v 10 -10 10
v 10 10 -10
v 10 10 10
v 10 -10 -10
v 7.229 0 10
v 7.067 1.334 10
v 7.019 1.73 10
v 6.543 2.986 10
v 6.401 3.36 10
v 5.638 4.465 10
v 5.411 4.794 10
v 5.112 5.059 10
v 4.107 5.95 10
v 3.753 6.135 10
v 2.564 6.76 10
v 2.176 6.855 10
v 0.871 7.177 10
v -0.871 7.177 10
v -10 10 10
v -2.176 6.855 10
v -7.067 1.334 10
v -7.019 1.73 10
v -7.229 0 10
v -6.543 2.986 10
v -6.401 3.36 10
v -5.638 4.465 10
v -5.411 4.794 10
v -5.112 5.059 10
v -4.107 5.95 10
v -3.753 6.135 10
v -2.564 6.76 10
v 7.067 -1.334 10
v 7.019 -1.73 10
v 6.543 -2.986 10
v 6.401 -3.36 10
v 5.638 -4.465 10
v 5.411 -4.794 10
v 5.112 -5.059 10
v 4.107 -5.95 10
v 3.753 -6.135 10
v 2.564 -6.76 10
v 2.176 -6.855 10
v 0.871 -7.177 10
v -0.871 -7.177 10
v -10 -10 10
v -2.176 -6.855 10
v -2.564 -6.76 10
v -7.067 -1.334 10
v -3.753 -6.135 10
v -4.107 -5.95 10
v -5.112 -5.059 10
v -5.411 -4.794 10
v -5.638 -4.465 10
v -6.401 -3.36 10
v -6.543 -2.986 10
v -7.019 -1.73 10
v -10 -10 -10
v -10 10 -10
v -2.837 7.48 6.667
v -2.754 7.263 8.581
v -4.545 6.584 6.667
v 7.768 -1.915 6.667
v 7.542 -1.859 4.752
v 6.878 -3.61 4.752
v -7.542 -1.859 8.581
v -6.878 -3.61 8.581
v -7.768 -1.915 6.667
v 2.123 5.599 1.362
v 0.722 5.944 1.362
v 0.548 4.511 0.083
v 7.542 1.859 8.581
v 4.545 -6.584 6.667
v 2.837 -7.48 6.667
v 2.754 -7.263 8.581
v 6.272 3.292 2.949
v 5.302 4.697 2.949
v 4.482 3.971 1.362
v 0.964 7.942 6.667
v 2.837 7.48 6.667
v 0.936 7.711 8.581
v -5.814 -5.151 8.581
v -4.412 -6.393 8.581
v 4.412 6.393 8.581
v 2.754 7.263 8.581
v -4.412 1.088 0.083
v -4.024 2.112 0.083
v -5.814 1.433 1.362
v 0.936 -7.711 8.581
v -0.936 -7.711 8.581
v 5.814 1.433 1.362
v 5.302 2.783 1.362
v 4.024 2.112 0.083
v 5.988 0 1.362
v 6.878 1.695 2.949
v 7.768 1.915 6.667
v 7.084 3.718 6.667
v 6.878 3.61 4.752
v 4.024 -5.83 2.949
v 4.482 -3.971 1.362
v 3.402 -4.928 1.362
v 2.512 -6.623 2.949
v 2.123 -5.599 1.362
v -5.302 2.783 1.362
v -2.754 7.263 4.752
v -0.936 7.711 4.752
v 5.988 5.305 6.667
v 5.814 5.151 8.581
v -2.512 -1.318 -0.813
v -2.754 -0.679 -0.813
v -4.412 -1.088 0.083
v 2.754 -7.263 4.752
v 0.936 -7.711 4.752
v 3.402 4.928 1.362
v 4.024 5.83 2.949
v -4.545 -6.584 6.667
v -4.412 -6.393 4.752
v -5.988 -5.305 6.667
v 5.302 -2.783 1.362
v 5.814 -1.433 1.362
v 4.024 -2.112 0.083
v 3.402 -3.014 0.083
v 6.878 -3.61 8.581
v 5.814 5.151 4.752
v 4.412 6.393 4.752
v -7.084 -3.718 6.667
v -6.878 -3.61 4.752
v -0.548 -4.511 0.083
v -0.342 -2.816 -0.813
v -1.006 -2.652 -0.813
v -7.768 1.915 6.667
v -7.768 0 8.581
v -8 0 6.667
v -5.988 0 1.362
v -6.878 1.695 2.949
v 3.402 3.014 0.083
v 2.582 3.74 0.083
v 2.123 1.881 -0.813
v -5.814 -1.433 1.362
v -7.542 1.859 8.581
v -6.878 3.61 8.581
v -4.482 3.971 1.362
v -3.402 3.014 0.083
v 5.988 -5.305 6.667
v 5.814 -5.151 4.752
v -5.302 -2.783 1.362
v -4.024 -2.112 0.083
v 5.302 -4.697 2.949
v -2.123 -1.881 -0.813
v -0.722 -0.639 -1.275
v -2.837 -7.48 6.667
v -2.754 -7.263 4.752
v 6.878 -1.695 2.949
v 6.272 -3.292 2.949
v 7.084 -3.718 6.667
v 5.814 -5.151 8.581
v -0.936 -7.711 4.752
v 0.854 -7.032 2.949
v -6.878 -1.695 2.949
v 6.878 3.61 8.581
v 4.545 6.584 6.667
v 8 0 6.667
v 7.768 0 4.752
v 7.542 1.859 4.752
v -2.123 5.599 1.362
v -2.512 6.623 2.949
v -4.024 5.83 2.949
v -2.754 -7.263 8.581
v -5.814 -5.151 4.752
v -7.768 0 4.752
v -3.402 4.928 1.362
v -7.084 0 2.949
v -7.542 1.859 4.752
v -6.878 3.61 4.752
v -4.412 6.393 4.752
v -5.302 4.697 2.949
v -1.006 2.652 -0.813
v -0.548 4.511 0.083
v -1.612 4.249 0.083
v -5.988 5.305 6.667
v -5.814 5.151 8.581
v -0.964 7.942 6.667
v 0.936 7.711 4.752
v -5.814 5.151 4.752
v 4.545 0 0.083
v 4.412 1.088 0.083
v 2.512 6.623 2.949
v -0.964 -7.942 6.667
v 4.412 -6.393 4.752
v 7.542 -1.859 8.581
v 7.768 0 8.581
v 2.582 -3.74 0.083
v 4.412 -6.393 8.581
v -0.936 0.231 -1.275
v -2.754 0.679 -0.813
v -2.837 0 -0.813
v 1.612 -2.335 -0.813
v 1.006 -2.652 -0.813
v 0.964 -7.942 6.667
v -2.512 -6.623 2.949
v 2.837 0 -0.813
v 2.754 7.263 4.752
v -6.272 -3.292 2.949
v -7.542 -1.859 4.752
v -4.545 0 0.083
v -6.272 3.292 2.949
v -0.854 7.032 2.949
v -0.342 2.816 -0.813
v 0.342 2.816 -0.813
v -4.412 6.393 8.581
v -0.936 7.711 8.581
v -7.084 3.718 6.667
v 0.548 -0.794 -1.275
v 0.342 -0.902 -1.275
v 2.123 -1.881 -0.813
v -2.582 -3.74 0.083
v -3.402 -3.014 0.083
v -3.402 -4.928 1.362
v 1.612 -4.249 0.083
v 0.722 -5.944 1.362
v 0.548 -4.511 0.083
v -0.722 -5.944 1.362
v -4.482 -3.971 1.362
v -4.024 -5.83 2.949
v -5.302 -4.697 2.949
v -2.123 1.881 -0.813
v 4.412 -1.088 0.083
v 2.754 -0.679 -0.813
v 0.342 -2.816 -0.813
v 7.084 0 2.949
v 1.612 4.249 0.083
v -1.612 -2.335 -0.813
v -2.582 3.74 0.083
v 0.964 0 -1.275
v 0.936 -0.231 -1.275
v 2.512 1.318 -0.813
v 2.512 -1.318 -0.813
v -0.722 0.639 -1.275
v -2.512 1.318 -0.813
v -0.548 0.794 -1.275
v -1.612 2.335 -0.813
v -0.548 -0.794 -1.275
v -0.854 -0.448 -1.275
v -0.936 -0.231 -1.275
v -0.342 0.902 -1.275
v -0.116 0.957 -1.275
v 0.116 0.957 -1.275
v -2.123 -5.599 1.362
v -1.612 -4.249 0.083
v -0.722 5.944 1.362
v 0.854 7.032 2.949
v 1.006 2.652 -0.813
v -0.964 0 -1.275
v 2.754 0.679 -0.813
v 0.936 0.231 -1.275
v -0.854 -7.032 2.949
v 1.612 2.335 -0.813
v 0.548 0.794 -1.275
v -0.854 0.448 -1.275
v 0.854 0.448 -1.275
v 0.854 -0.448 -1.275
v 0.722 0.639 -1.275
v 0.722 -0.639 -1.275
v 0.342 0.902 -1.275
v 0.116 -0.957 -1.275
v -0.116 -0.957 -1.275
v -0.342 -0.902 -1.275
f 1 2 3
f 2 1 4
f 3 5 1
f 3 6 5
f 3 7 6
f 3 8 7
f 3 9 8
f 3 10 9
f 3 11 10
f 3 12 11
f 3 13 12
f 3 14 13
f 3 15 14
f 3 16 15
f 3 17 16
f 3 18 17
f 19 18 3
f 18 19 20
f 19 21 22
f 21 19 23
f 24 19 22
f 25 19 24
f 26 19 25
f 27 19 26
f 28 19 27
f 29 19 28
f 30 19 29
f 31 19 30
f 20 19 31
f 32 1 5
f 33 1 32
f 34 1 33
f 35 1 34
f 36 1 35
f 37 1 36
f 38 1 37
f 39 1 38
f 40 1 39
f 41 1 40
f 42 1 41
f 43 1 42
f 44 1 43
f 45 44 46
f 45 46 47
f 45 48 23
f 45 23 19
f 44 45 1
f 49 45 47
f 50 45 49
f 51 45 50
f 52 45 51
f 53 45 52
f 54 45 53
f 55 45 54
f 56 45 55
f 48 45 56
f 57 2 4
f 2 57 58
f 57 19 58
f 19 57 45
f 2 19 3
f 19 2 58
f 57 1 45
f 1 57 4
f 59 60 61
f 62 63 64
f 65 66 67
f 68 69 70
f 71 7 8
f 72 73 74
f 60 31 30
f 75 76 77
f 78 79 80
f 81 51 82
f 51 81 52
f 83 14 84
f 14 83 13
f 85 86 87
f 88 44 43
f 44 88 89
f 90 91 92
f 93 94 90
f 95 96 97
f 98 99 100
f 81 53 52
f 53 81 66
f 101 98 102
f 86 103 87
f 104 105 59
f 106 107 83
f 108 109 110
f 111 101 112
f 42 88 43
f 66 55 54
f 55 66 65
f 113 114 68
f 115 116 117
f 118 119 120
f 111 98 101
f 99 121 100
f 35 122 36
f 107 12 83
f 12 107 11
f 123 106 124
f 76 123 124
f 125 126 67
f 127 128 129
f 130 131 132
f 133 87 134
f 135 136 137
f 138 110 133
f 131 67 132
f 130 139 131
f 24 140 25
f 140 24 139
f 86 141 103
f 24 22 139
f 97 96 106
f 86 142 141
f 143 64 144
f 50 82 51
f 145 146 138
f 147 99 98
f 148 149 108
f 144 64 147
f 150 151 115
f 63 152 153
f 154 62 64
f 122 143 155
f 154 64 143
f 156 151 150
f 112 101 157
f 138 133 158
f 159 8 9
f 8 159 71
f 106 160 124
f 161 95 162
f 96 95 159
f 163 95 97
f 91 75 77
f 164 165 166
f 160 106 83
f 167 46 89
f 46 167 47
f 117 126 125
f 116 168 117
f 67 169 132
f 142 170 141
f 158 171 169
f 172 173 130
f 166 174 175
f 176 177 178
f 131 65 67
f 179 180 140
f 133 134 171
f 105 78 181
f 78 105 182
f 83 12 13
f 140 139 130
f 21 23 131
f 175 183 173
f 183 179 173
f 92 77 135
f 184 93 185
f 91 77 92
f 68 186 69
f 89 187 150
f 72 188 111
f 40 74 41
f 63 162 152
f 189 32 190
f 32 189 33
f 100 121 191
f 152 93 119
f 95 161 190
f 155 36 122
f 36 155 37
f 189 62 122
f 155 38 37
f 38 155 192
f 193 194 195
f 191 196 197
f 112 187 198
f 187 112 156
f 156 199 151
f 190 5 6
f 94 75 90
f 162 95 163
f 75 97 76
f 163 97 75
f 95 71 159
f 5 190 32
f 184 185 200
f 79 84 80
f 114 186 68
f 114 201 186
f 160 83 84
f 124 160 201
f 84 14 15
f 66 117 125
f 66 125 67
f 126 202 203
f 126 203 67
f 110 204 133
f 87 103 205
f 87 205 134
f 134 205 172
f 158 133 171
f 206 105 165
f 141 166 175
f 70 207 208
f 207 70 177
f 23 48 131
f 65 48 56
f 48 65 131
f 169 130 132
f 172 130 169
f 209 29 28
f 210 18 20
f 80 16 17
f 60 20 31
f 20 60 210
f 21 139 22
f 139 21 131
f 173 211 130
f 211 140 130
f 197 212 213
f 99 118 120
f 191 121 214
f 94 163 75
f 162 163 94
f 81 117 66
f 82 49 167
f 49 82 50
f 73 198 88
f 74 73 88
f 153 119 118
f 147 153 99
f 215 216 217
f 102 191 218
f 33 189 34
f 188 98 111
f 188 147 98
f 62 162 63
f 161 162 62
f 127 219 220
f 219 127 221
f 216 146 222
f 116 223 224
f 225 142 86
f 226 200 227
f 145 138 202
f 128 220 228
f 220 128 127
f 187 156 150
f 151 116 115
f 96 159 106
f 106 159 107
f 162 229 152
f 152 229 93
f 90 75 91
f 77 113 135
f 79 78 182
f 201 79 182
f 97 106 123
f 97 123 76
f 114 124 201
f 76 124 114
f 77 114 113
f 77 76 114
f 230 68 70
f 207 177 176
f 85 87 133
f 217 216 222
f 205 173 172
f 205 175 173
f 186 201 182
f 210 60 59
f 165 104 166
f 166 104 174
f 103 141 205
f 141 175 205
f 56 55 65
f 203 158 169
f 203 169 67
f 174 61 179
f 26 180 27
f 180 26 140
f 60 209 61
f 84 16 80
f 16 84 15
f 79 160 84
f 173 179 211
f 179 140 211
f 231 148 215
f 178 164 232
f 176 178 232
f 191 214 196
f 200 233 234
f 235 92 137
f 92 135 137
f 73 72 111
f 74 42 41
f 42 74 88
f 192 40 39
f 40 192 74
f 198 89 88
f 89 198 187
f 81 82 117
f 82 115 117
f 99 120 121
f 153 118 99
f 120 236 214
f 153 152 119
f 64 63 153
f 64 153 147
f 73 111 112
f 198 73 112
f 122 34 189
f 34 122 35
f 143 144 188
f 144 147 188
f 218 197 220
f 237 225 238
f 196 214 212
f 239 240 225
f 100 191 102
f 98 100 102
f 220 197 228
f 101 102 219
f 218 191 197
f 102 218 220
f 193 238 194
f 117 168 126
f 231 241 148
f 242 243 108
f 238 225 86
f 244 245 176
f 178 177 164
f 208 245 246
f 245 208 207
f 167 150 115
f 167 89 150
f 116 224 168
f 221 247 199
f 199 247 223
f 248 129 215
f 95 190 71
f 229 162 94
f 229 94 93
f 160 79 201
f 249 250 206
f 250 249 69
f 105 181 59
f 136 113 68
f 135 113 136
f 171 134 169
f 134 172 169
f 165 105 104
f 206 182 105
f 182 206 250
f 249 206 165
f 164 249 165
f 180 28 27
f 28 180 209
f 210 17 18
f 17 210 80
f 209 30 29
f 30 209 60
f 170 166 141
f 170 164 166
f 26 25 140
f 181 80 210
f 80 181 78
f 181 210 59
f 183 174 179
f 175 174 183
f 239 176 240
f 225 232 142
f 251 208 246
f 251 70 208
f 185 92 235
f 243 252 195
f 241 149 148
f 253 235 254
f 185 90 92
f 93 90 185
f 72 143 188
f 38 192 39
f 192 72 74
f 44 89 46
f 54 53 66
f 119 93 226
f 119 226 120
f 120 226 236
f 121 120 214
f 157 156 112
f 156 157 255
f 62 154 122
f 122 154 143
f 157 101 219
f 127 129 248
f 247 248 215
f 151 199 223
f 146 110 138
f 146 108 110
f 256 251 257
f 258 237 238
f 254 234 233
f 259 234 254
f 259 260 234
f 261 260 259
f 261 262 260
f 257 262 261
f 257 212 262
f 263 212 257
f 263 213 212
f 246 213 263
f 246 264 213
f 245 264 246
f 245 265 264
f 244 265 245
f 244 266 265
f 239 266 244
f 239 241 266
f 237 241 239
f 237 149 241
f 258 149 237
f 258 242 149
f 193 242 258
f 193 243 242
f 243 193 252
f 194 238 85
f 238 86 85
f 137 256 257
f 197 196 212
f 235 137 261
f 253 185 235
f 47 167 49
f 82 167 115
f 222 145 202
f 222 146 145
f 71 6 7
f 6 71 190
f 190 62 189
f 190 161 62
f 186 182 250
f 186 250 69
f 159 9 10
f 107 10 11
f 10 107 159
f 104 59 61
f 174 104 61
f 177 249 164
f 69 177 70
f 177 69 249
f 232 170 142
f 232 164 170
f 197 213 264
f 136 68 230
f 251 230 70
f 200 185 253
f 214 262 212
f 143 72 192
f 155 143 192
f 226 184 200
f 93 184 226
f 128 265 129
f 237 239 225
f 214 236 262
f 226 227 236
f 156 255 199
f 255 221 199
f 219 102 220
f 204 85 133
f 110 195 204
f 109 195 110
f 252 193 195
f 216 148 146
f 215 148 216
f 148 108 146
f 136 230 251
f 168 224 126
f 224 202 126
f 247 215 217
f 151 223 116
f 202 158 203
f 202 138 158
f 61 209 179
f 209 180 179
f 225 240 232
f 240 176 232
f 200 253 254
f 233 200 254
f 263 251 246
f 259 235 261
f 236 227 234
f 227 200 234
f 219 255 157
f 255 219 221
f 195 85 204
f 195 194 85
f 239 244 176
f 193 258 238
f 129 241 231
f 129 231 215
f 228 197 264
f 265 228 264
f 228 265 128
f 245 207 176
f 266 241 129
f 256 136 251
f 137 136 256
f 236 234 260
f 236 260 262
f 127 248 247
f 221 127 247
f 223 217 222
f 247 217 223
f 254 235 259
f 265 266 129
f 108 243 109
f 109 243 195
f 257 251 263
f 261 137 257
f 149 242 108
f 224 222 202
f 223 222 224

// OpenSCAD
botcube();

module botcube()
{
	difference()
	{
		union()
		{
			cube(size=[20, 20, 20], center=true);
	
			for (i=[0:3])
				rotate([0,0,90*i])
					translate([0,-10, 0])
						rotate([90,0,0])
							linear_extrude(file="m.dxf", height=1.5);
		}

		translate([0,0,20/3])
			sphere(r=20/2-2);
	}
}
